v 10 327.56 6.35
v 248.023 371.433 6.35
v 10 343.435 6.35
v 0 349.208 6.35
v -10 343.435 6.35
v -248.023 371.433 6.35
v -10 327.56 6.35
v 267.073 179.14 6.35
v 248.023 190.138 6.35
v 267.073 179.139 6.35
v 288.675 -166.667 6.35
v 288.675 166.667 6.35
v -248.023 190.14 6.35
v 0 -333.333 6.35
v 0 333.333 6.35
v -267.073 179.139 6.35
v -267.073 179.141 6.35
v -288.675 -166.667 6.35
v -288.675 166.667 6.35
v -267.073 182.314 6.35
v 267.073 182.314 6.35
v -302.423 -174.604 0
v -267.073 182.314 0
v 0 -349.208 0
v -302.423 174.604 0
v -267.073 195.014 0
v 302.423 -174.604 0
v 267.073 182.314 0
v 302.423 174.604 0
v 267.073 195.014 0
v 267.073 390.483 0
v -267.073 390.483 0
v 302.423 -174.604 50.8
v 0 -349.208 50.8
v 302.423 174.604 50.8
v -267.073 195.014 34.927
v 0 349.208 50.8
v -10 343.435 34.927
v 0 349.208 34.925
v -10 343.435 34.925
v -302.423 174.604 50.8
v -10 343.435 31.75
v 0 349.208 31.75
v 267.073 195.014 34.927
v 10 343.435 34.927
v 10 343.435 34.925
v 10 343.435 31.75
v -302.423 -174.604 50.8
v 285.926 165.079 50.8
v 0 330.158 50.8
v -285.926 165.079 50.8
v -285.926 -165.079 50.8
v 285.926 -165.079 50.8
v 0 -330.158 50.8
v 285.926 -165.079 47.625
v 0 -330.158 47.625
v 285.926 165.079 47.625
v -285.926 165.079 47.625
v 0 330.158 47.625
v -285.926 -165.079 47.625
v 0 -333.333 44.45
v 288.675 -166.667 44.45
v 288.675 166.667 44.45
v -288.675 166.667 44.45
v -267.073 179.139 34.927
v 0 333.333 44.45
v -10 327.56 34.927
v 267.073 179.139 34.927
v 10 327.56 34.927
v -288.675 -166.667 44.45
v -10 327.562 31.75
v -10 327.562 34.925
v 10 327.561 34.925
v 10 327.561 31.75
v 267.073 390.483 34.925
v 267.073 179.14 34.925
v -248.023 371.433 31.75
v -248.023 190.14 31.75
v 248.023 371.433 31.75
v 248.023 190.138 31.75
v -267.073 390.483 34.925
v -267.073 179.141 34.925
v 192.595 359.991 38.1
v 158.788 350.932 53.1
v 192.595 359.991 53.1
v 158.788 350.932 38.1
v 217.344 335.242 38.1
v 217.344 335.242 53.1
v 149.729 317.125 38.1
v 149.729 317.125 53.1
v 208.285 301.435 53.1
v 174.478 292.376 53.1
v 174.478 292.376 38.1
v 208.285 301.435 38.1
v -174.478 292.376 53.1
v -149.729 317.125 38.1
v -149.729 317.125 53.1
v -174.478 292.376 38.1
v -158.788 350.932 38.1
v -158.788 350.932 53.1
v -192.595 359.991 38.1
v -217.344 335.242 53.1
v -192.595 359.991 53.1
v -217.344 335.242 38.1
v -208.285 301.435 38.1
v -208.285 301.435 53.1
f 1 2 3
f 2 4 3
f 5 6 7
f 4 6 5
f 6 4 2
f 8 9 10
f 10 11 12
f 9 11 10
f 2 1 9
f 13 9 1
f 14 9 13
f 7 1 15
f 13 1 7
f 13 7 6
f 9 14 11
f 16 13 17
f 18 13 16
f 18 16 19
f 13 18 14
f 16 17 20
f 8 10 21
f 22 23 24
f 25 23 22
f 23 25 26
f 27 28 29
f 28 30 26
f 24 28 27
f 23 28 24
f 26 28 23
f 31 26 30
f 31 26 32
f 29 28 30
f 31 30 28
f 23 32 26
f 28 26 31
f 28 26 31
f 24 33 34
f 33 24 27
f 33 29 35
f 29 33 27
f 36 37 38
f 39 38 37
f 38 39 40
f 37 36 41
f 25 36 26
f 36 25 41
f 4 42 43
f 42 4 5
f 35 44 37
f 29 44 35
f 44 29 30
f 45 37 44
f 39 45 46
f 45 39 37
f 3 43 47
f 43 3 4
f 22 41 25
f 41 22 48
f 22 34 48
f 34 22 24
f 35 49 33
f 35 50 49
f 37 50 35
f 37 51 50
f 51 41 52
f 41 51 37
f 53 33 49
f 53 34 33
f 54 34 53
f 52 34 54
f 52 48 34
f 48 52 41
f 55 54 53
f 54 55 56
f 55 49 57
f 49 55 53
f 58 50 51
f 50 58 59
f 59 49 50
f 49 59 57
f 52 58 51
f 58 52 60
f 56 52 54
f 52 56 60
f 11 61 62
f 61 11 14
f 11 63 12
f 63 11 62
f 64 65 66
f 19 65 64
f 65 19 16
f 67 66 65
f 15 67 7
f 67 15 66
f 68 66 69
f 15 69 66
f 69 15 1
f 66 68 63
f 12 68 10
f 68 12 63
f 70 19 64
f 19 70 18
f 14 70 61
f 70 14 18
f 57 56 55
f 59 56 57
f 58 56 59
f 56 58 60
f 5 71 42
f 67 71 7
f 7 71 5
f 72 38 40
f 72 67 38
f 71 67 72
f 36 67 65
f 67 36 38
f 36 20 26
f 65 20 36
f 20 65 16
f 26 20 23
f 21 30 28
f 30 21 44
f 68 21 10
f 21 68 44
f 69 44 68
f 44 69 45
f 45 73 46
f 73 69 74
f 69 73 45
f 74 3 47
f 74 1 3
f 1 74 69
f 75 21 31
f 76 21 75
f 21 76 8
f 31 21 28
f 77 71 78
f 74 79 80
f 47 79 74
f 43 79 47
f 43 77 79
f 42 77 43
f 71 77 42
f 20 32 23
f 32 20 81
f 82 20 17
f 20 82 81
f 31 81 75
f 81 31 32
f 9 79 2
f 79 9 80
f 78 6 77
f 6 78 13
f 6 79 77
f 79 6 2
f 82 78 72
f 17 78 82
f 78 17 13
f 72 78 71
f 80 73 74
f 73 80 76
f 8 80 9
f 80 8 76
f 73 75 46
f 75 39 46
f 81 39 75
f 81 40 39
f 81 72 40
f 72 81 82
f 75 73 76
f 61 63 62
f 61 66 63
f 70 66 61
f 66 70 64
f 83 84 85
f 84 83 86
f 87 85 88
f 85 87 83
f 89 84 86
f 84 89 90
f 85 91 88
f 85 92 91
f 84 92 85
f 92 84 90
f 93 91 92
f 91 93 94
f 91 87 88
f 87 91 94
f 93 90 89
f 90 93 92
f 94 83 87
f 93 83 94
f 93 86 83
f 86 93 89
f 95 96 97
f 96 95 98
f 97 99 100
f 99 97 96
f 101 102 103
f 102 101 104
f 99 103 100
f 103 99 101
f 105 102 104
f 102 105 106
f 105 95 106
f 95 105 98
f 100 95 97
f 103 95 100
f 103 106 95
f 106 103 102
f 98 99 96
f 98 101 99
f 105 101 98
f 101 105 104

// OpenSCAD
fudge=0.004;

// honeycomb dimensions
stroke = 3.2;   // this needs to be double the wall width you actually want when printing, not sure why...
                // the printer can print in increments of 0.4 mm so we make the outside walls 0.8mm and the inside
                // walls 1.6mm.
notch_width = 21;
notch_depth = 1;
distance_apart = 33 + 1/3;
wall_height = 38.1; // 1 1/2"
triangle_height = (distance_apart * sqrt(3)) / 2;
triangle_zaxis_offset=-fudge/2;
num_rings = 10;
radius = distance_apart * num_rings;

// diffuser dimensions
diffuser_thickness = 3.175; // 1/8 inch

// backboard dimensions
backboard_thickness = 6.35; // 1/4 inch

// side wall dimensions
side_wall_thickness = 19.05;// 3/4 inch
side_wall_height = backboard_thickness + wall_height + (2 * diffuser_thickness);

// chin dimensions
chin_width = (radius + side_wall_thickness) * sin(60) * 2 - (4 * side_wall_thickness);
chin_depth = side_wall_thickness + wall_height;
chin_wall_height = 31.75; // 1 1/4 inch

// knob dimensions
knob_height = 15;
knob_radius = 35;


//
// Draw all the component pieces
//
color("yellow") backboard();
color("blue") honeycomb_sidewall();
//color("black") honeycomb();
color("gray", 0.25) diffuser();

color("brown") chin_sidewall();
//color("green") translate([-559 - side_wall_thickness, -770, backboard_thickness]) rotate(90) resize([72.8, 80.4, 25]) import("OBJ_PCB_ESP32 Kaleidoscope.stl");
color("brown", 0.5) chin_top();

color("silver") translate([chin_width / 4 + 50, radius - chin_depth + 50, chin_wall_height + backboard_thickness]) rotate(15) cylinder(h=knob_height, r=knob_radius, $fn=6);
color("silver") translate([-(chin_width / 4 + 50), radius - chin_depth + 50, chin_wall_height + backboard_thickness]) rotate(45) cylinder(h=knob_height, r=knob_radius, $fn=6);


module backboard()
{
    union()
    {
        // draw the hexagon
        rotate(30)
        cylinder(h=backboard_thickness, r=(radius + diffuser_thickness), $fn=6);
        
        // draw the chin
        translate([side_wall_thickness - chin_width / 2 - diffuser_thickness, chin_depth + side_wall_thickness, 0])
        cube([chin_width - (2 * side_wall_thickness) + (2 *  + diffuser_thickness), radius - (2 * side_wall_thickness) + diffuser_thickness, backboard_thickness]);
    }
}

module diffuser()
{
    // draw the diffuser hexagon
    rotate(30)
    translate([0, 0, backboard_thickness + wall_height]) 
    cylinder(h=diffuser_thickness, r=(radius + diffuser_thickness), $fn=6);
}

module honeycomb_sidewall()
{
    rotate(30)
    difference()
    {
        // draw the expanded hexagon
        cylinder(h=side_wall_height, r=(radius + side_wall_thickness - diffuser_thickness), $fn=6);

        // now remove the face of the honeycomb leaving a lip to hold the contents (diffuser + honeycomb + backboard)
        translate([0, 0, -fudge / 2]) 
        cylinder(h=side_wall_height + fudge, r=radius - diffuser_thickness, $fn=6);

        // now remove bottom of the honeycomb to leave room for the diffuser, honeycomb and backboard
        translate([0, 0, -diffuser_thickness]) 
        cylinder(h=side_wall_height, r=radius, $fn=6);
        
        // remove the chin in two pieces to leave a support
        rotate(-30)
        translate([-chin_width / 2, chin_depth, -fudge/2]) 
        cube([chin_width / 2 - 10, radius, chin_wall_height + diffuser_thickness + fudge]);
        rotate(-30)
        translate([10, chin_depth, -fudge/2]) 
        cube([chin_width / 2 - 10, radius, chin_wall_height + diffuser_thickness + fudge]);
    }
}

module chin_sidewall()
{
    difference()
    {
        // draw the chin
        translate([-chin_width / 2, chin_depth, 0]) 
        cube([chin_width, radius, chin_wall_height]);
        
        // remove the chin insides
        translate([-chin_width / 2 + side_wall_thickness, chin_depth, - fudge / 2]) 
        cube([chin_width - (2 * side_wall_thickness), radius - side_wall_thickness, chin_wall_height + fudge]);

        // remove the expanded hexagon
        rotate(30) translate([0, fudge / 2, 0]) 
        cylinder(h=side_wall_height + fudge, r=radius, $fn=6);
        
        // remove a notch for the backboard
        backboard();
    }
}

module chin_top()
{
    difference()
    {
        // draw a lid for the chin
        translate([-chin_width / 2, chin_depth, chin_wall_height]) 
        cube([chin_width, radius, diffuser_thickness]);
        
        // remove the expanded hexagon
        rotate(30) translate([0, fudge / 2, 0]) 
        cylinder(h=side_wall_height + fudge, r=radius, $fn=6);
    }
}

module honeycomb()
{
    translate([0, 0, backboard_thickness]) 
    difference()
    {
        // draw the hexagon
        rotate(30) cylinder(h=wall_height, r=radius, $fn=6);
        
        // remove notches for the led strips
        for (i = [num_rings / 2 - 1:-1:(-2 * num_rings) + (num_rings / 2)]) // draws the square
        {
            orgin = [triangle_height * -10, distance_apart * i  + (triangle_height - notch_width) / 2, wall_height - notch_depth];
                                                                               //the + 1 is needed to finish the etch
            translate(orgin) rotate(30)cube([distance_apart * (num_rings * 2 + 1), notch_width,notch_depth]); 
        }
        
        // remove the triangles for the lights
        for (y = [num_rings:-1:-num_rings]) 
        {
            for (x = [-num_rings:2:num_rings])
            {
                translate([x * triangle_height + (triangle_height * (2/3)), y * distance_apart, triangle_zaxis_offset]) rotate(60) 
                    cylinder(h=wall_height+fudge, r=(triangle_height* 2/3) - stroke/2, $fn=3);
                translate([x * triangle_height - (triangle_height * (2/3)), y * distance_apart, triangle_zaxis_offset]) rotate(0)
                    cylinder(h=wall_height+fudge, r=(triangle_height* 2/3) - stroke/2, $fn=3);
                
                translate([(x+1) * triangle_height + (triangle_height * (2/3)), (y) * distance_apart + distance_apart / 2, triangle_zaxis_offset]) rotate(60) 
                    cylinder(h=wall_height+fudge, r=(triangle_height* 2/3) - stroke/2, $fn=3);
                translate([(x+1) * triangle_height - (triangle_height * (2/3)), (y) * distance_apart + distance_apart / 2, triangle_zaxis_offset]) rotate(0)
                    cylinder(h=wall_height+fudge, r=(triangle_height* 2/3) - stroke/2, $fn=3);        
            }
        }
        // shrink the size for testing purposes
        translate([0,0,-1]) rotate(60) cube([1000,1000,100]);
        translate([0,0,-1]) rotate(120) cube([1000,1000,100]);
        translate([0,0,-1]) rotate(180) cube([1000,1000,100]);
        translate([0,0,-1]) rotate(-0) cube([1000,1000,100]);
        translate([0,0,-1]) rotate(-30) cube([1000,1000,100]);
/*
        translate([0,-4 * distance_apart,-1]) rotate(30) cube([1000,1000,100]);
        translate([0,-4 * distance_apart,-1]) rotate(-30) cube([1000,1000,100]);
*/
    }
}
